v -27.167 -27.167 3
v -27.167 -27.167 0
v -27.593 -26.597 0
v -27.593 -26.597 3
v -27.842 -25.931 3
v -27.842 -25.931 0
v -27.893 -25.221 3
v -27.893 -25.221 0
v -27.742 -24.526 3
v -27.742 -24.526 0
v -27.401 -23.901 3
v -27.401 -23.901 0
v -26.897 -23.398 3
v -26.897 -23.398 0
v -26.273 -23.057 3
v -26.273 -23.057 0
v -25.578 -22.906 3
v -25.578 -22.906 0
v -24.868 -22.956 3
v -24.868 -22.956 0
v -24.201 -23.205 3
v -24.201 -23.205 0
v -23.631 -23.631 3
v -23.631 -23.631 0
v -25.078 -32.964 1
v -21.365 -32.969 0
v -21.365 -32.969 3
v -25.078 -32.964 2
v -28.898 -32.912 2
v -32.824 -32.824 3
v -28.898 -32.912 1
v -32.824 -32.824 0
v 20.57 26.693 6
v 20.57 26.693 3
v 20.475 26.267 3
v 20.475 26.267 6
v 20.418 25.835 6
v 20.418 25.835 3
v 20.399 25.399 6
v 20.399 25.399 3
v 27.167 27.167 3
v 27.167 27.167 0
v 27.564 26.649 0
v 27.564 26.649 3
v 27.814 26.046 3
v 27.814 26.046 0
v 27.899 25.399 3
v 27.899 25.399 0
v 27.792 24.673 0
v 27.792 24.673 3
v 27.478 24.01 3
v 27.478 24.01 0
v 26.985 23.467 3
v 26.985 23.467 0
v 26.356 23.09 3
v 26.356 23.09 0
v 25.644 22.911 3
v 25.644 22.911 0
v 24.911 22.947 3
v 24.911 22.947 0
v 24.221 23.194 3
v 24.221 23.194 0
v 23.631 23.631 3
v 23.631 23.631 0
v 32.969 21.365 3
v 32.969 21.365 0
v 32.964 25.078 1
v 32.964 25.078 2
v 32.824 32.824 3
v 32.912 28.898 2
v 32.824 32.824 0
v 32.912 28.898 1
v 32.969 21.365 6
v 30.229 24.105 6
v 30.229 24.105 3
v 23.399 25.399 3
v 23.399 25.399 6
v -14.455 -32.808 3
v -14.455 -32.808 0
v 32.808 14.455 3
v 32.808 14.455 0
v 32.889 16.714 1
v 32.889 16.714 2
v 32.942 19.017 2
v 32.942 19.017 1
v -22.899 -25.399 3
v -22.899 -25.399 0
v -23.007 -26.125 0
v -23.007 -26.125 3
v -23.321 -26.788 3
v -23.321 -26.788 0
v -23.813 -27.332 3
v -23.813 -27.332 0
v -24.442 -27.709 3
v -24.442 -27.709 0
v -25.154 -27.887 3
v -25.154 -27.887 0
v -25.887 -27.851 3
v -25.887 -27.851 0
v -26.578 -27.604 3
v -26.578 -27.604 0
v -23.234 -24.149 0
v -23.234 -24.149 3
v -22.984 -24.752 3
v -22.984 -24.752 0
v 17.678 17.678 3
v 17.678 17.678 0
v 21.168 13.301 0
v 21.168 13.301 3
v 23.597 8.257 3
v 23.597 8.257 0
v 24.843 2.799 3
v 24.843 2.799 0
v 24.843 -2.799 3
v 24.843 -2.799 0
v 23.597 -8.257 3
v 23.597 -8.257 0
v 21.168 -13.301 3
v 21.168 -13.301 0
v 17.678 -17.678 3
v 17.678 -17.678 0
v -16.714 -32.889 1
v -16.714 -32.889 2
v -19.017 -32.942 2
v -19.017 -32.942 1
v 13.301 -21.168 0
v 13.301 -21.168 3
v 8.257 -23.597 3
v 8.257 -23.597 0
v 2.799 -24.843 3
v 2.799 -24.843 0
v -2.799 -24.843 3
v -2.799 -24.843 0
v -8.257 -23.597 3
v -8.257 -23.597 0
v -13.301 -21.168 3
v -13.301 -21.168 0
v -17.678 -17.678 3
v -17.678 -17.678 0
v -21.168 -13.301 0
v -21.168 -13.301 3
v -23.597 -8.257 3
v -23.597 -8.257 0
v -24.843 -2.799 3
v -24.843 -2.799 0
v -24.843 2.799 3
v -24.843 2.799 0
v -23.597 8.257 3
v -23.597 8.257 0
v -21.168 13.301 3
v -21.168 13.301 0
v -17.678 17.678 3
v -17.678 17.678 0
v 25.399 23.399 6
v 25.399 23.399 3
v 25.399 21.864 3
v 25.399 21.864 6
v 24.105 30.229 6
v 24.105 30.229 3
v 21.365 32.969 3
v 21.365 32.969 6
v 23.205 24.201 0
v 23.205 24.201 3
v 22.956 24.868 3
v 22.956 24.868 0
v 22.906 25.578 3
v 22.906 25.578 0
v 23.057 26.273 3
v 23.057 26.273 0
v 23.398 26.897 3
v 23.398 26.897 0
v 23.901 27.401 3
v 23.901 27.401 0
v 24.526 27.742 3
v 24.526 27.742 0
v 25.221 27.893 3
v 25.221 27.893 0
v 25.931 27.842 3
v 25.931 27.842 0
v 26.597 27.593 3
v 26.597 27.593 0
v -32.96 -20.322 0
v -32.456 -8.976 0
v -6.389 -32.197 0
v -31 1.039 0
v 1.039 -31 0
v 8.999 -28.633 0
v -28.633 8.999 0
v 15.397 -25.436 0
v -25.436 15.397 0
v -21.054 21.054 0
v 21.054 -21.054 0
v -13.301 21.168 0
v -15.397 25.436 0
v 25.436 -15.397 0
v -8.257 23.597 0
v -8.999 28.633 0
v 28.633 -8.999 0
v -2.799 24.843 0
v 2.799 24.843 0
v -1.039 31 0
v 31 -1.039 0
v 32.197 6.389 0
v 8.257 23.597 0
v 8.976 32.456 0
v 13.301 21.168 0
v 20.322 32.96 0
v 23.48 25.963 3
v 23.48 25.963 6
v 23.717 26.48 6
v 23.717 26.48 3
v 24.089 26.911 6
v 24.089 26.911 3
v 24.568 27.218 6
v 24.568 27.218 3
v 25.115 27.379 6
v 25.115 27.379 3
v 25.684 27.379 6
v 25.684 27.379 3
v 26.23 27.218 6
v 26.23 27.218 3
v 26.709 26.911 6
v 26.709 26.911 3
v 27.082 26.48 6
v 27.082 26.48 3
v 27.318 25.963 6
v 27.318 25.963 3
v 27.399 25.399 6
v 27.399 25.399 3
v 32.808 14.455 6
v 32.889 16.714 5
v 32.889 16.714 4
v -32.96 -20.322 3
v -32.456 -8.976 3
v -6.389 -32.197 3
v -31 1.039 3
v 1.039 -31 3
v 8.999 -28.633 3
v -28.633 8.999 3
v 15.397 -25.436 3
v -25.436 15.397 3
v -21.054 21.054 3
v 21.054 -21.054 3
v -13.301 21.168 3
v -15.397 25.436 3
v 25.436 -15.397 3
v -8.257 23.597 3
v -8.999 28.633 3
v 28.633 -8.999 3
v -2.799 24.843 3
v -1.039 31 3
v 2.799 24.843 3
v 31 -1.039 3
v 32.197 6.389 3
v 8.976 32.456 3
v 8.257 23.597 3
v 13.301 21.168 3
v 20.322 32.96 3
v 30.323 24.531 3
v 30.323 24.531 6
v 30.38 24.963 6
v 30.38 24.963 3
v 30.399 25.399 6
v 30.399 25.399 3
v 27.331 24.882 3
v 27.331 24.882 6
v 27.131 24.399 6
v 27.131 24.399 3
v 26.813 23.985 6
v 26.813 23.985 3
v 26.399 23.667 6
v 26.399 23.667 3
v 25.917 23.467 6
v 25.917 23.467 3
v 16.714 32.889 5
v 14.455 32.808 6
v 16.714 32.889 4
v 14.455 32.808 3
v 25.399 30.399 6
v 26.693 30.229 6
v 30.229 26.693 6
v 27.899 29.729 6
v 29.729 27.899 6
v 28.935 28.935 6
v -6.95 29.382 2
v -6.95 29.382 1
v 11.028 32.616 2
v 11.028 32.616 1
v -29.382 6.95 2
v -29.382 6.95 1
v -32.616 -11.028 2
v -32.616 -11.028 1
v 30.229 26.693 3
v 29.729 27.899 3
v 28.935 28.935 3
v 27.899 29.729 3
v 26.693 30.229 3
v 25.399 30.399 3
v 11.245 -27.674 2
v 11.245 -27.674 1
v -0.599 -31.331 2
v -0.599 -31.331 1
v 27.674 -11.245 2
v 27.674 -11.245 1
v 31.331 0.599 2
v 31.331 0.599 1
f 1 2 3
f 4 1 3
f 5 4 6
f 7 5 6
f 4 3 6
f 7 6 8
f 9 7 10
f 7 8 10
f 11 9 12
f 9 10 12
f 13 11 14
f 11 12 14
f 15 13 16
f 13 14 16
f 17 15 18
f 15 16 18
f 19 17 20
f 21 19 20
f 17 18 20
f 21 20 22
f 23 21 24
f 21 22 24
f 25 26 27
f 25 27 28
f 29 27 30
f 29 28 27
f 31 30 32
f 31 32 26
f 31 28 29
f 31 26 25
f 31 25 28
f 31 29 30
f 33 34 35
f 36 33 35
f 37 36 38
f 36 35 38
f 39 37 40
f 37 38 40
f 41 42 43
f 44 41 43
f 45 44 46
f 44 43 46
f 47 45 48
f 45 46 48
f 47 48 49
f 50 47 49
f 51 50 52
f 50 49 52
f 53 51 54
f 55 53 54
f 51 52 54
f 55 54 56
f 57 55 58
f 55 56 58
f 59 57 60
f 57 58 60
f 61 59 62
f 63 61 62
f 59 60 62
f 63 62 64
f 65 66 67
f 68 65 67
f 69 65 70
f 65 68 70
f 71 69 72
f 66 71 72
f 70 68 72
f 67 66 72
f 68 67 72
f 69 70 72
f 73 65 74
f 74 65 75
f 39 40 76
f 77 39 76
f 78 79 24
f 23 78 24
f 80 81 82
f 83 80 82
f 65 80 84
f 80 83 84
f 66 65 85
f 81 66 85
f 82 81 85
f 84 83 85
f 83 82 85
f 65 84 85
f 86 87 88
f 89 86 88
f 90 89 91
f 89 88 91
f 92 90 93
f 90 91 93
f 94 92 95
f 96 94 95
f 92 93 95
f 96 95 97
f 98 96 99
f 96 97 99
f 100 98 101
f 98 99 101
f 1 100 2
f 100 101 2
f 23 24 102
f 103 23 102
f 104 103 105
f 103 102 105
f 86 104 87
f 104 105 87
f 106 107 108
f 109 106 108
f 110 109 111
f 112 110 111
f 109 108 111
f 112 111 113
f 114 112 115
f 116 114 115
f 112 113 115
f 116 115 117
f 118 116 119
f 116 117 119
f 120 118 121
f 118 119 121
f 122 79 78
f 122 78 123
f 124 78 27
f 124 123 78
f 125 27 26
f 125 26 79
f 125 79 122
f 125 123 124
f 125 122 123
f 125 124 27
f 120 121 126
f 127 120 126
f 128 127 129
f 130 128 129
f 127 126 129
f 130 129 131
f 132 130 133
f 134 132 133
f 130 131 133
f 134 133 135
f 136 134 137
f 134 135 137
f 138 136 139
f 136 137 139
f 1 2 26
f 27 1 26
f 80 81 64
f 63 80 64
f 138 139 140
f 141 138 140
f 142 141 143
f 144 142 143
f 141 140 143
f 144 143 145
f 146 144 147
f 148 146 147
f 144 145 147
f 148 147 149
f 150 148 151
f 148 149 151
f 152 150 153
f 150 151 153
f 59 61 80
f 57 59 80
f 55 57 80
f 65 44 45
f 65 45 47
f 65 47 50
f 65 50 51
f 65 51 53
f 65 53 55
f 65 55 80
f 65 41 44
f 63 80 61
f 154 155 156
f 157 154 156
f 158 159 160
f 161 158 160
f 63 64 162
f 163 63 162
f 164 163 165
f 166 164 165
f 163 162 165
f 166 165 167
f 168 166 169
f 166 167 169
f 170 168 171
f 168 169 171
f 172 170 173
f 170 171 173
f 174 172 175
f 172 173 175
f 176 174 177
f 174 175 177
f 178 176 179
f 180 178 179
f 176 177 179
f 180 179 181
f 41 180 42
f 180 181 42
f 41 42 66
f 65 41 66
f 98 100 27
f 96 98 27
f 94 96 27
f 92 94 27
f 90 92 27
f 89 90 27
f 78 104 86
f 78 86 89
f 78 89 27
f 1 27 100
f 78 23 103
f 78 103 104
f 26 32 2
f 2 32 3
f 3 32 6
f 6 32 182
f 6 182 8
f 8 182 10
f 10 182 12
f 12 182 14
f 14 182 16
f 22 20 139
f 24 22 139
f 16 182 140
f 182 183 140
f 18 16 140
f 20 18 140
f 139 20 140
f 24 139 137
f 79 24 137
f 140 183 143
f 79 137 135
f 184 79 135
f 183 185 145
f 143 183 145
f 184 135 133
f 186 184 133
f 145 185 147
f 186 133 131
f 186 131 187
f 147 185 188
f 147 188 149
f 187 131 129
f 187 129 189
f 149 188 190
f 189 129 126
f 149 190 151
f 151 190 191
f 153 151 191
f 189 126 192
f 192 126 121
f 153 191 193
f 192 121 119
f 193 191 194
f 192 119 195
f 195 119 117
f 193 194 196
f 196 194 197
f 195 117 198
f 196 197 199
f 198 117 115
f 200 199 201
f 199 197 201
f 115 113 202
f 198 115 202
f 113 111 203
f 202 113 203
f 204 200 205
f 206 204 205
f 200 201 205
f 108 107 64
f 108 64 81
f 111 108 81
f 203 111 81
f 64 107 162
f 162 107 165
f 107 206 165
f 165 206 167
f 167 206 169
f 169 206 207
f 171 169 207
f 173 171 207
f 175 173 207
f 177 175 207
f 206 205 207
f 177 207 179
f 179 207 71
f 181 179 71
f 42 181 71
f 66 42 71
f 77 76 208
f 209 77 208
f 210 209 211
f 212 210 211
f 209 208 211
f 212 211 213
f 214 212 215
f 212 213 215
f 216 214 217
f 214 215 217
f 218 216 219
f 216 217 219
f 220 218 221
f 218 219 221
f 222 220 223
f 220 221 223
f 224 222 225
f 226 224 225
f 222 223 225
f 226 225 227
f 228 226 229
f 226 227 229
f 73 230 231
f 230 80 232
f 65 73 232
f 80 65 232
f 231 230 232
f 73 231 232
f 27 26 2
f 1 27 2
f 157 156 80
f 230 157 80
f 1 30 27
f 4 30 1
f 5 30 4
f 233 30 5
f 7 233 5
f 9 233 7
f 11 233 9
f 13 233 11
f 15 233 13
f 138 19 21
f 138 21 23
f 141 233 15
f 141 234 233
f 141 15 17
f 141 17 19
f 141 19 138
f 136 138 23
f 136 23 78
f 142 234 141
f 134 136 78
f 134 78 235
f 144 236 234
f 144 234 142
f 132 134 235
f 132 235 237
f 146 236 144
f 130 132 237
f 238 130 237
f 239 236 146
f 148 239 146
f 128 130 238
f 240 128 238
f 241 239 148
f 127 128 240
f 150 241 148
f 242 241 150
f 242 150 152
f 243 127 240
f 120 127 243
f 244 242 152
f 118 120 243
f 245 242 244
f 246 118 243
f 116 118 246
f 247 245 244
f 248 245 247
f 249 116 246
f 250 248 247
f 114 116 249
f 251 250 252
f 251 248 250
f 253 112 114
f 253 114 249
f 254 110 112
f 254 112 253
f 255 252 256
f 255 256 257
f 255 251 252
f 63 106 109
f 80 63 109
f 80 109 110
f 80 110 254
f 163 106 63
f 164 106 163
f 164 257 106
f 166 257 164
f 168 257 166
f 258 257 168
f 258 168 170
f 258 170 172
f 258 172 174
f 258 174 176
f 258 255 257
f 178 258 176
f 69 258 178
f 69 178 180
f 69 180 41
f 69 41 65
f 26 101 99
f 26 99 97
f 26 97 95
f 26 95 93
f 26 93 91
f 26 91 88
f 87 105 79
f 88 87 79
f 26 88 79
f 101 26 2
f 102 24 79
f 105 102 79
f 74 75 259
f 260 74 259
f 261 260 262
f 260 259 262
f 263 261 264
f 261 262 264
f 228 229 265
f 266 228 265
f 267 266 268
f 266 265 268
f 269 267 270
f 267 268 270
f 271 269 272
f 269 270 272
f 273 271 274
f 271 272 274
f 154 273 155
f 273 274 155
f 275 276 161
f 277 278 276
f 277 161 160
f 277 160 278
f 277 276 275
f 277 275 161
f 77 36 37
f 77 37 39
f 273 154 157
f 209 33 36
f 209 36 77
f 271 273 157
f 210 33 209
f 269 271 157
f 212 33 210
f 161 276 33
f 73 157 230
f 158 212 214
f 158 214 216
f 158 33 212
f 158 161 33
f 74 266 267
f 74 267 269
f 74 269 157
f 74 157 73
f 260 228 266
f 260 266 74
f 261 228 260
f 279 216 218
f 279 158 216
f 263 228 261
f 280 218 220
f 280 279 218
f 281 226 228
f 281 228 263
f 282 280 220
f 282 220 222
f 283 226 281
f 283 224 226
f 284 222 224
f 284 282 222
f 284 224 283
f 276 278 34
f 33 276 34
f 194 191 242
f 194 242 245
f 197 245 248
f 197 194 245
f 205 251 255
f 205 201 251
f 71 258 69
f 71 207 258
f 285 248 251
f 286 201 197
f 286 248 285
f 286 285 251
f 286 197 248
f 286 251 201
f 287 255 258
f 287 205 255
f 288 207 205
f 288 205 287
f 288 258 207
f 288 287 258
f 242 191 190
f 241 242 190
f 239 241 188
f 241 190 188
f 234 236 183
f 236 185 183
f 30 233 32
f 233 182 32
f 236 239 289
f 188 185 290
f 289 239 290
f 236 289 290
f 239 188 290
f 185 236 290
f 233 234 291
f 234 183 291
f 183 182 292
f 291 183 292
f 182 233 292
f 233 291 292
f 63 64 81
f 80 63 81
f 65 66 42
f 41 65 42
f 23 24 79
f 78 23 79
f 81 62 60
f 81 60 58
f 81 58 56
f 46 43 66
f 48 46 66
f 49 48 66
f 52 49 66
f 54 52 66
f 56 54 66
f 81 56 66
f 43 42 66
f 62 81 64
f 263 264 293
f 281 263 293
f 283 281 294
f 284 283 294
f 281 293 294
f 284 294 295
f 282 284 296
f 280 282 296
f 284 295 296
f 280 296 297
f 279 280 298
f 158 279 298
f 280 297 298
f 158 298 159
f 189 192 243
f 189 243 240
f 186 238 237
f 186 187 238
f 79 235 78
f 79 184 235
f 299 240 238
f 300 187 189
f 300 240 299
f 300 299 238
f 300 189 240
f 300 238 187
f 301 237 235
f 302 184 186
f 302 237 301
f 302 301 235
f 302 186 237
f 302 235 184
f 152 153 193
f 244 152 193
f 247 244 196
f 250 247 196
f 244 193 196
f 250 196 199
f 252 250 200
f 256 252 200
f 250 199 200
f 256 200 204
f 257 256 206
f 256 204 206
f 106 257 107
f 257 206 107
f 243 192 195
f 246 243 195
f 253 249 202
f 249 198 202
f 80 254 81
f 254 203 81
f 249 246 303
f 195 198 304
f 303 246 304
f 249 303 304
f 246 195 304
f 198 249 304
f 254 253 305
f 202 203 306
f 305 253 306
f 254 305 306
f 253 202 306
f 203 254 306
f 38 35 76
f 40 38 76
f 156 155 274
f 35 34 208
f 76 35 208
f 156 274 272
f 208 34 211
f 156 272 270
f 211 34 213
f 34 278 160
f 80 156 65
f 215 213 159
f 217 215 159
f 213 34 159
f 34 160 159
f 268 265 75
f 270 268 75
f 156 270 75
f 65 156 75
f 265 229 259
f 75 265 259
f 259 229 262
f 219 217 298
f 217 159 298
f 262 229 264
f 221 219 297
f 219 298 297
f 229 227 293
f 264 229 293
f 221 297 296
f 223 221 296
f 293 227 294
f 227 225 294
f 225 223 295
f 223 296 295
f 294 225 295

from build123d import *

# Parameters (mm, degrees)
F1_DEPTH = 3
F2_DEPTH = 3
F4_DEPTH = 3


with BuildPart() as f1:
    # F0 (on Top) → F1 (new body)
    with BuildSketch(Plane.XY):
        with BuildLine():
            Line((-17.6776695297, 17.6776695297), (-21.0540489196, 21.0540489196))
            add(Edge.make_bspline(
                [(-21.0540489196, 21.0540489196), (-32.6172978292, 8.9064244237), (-33.4403195997, -9.1381745127), (-32.823822752, -32.823822752)],
                knots=[5.6905599108, 5.6905599108, 5.6905599108, 5.6905599108, 59.653525178, 59.653525178, 59.653525178, 59.653525178], degree=3))
            add(Edge.make_bspline(
                [(-21.3653856494, -32.9685513557), (-25.0248508067, -32.9903335411), (-28.8447343113, -32.9273916076), (-32.823822752, -32.823822752)],
                knots=[50.5879758987, 50.5879758987, 50.5879758987, 50.5879758987, 59.653525178, 59.653525178, 59.653525178, 59.653525178], degree=3))
            Line((-21.3653856494, -32.9685513557), (-27.1669685025, -27.1669685025))
            ThreePointArc((-27.1669685025, -27.1669685025), (-27.1669685025, -23.6314345966), (-23.6314345966, -23.6314345966))
            Line((-23.6314345966, -23.6314345966), (-14.4553227676, -32.8075464256))
            add(Edge.make_bspline(
                [(21.0540489196, -21.0540489196), (12.269278567, -29.4162176905), (0.400558033, -32.1615526479), (-14.4553227676, -32.8075464256)],
                knots=[5.6905599108, 5.6905599108, 5.6905599108, 5.6905599108, 44.7148364329, 44.7148364329, 44.7148364329, 44.7148364329], degree=3))
            add(Edge.make_bspline(
                [(21.0540489196, -21.0540489196), (29.4162176905, -12.269278567), (32.1615526479, -0.400558033), (32.8075464256, 14.4553227676)],
                knots=[5.6905599108, 5.6905599108, 5.6905599108, 5.6905599108, 44.7148364329, 44.7148364329, 44.7148364329, 44.7148364329], degree=3))
            Line((32.8075464256, 14.4553227676), (23.6314345966, 23.6314345966))
            Line((23.6314345966, 23.6314345966), (17.6776695297, 17.6776695297))
            ThreePointArc((17.6776695297, 17.6776695297), (25, 0), (17.6776695297, -17.6776695297))
            ThreePointArc((17.6776695297, -17.6776695297), (0, -25), (-17.6776695297, -17.6776695297))
            ThreePointArc((-17.6776695297, -17.6776695297), (-25, 0), (-17.6776695297, 17.6776695297))
        make_face()
        with BuildLine():
            add(Edge.make_bspline(
                [(-21.0540489196, 21.0540489196), (-8.9064244237, 32.6172978292), (9.1381745127, 33.4403195997), (32.823822752, 32.823822752)],
                knots=[5.6905599108, 5.6905599108, 5.6905599108, 5.6905599108, 59.653525178, 59.653525178, 59.653525178, 59.653525178], degree=3))
            Line((-21.0540489196, 21.0540489196), (-17.6776695297, 17.6776695297))
            ThreePointArc((-17.6776695297, 17.6776695297), (0, 25), (17.6776695297, 17.6776695297))
            Line((17.6776695297, 17.6776695297), (23.6314345966, 23.6314345966))
            ThreePointArc((23.6314345966, 23.6314345966), (23.6314345966, 27.1669685025), (27.1669685025, 27.1669685025))
            Line((27.1669685025, 27.1669685025), (32.823822752, 32.823822752))
        make_face()
        with BuildLine():
            add(Edge.make_bspline(
                [(32.9685513557, 21.3653856494), (32.9903335411, 25.0248508067), (32.9273916076, 28.8447343113), (32.823822752, 32.823822752)],
                knots=[50.5879758987, 50.5879758987, 50.5879758987, 50.5879758987, 59.653525178, 59.653525178, 59.653525178, 59.653525178], degree=3))
            Line((32.823822752, 32.823822752), (27.1669685025, 27.1669685025))
            Line((27.1669685025, 27.1669685025), (32.9685513557, 21.3653856494))
        make_face()
    extrude(amount=F1_DEPTH)


with BuildPart() as f2:
    # F0 (on Top) → F2 (new body)
    with BuildSketch(Plane.XY):
        with BuildLine():
            Line((32.9685513557, 21.3653856494), (27.1669685025, 27.1669685025))
            ThreePointArc((27.1669685025, 27.1669685025), (27.7089003809, 26.3559101305), (27.8992015496, 25.3992015496))
            ThreePointArc((27.8992015496, 25.3992015496), (26.3559101305, 23.0895027183), (23.6314345966, 23.6314345966))
            Line((23.6314345966, 23.6314345966), (32.8075464256, 14.4553227676))
            add(Edge.make_bspline(
                [(32.8075464256, 14.4553227676), (32.9047682549, 16.6911274411), (32.9544397107, 18.9945917154), (32.9685513557, 21.3653856494)],
                knots=[44.7148364329, 44.7148364329, 44.7148364329, 44.7148364329, 50.5879758987, 50.5879758987, 50.5879758987, 50.5879758987], degree=3))
        make_face()
    extrude(amount=F2_DEPTH)


with BuildPart() as f2b:
    # F0 (on Top) → F2, piece 2 (new body)
    with BuildSketch(Plane.XY):
        with BuildLine():
            Line((-27.1669685025, -27.1669685025), (-21.3653856494, -32.9685513557))
            add(Edge.make_bspline(
                [(-14.4553227676, -32.8075464256), (-16.6911274411, -32.9047682549), (-18.9945917154, -32.9544397107), (-21.3653856494, -32.9685513557)],
                knots=[44.7148364329, 44.7148364329, 44.7148364329, 44.7148364329, 50.5879758987, 50.5879758987, 50.5879758987, 50.5879758987], degree=3))
            Line((-14.4553227676, -32.8075464256), (-23.6314345966, -23.6314345966))
            ThreePointArc((-23.6314345966, -23.6314345966), (-23.0895027183, -24.4424929687), (-22.8992015496, -25.3992015496))
            ThreePointArc((-22.8992015496, -25.3992015496), (-24.4424929687, -27.7089003809), (-27.1669685025, -27.1669685025))
        make_face()
    extrude(amount=F2_DEPTH)


with BuildPart() as f4:
    # F3 (on face) → F4 (new body)
    with BuildSketch(Plane.XY.offset(3)):
        with BuildLine():
            ThreePointArc((20.5695724181, 26.6932967751), (20.4419772427, 26.0518325107), (20.3992015496, 25.3992015496))
            Line((20.3992015496, 25.3992015496), (21.8636676436, 25.3992015496))
            Line((21.8636676436, 25.3992015496), (20.5695724181, 26.6932967751))
        make_face()
        with BuildLine():
            Line((25.3992015496, 21.8636676436), (26.6932967751, 20.5695724181))
            ThreePointArc((26.6932967751, 20.5695724181), (28.9347354555, 21.8636676436), (30.228830681, 24.1051063241))
            Line((30.228830681, 24.1051063241), (27.1669685025, 27.1669685025))
            ThreePointArc((27.1669685025, 27.1669685025), (24.4424929687, 27.7089003809), (22.8992015496, 25.3992015496))
            Line((22.8992015496, 25.3992015496), (23.3992015496, 25.3992015496))
            ThreePointArc((23.3992015496, 25.3992015496), (25.3992015496, 27.3992015496), (27.3992015496, 25.3992015496))
            ThreePointArc((27.3992015496, 25.3992015496), (26.8134151119, 23.9849879872), (25.3992015496, 23.3992015496))
            Line((25.3992015496, 23.3992015496), (25.3992015496, 21.8636676436))
        make_face()
        with BuildLine():
            ThreePointArc((30.228830681, 24.1051063241), (28.9347354555, 21.8636676436), (26.6932967751, 20.5695724181))
            Line((26.6932967751, 20.5695724181), (32.8075464256, 14.4553227676))
            add(Edge.make_bspline(
                [(32.8075464256, 14.4553227676), (32.9047682549, 16.6911274411), (32.9544397107, 18.9945917154), (32.9685513557, 21.3653856493)],
                knots=[0.7495757593, 0.7495757593, 0.7495757593, 0.7495757593, 0.8480299487, 0.8480299487, 0.8480299487, 0.8480299487], degree=3))
            Line((32.9685513557, 21.3653856494), (30.228830681, 24.1051063241))
        make_face()
        with BuildLine():
            Line((14.4553227676, 32.8075464256), (20.5695724181, 26.6932967751))
            ThreePointArc((20.5695724181, 26.6932967751), (21.8636676436, 28.9347354555), (24.1051063241, 30.228830681))
            Line((24.1051063241, 30.228830681), (21.3653856494, 32.9685513557))
            add(Edge.make_bspline(
                [(14.4553227676, 32.8075464256), (16.6911274411, 32.9047682549), (18.9945917154, 32.9544397107), (21.3653856493, 32.9685513557)],
                knots=[0.7495757593, 0.7495757593, 0.7495757593, 0.7495757593, 0.8480299487, 0.8480299487, 0.8480299487, 0.8480299487], degree=3))
        make_face()
        with BuildLine():
            ThreePointArc((24.1051063241, 30.228830681), (21.8636676436, 28.9347354555), (20.5695724181, 26.6932967751))
            Line((20.5695724181, 26.6932967751), (21.8636676436, 25.3992015496))
            Line((21.8636676436, 25.3992015496), (22.8992015496, 25.3992015496))
            ThreePointArc((22.8992015496, 25.3992015496), (24.4424929687, 27.7089003809), (27.1669685025, 27.1669685025))
            Line((27.1669685025, 27.1669685025), (24.1051063241, 30.228830681))
        make_face()
        with BuildLine():
            ThreePointArc((30.3992015496, 25.3992015496), (28.4430086946, 29.365968251), (24.1051063241, 30.228830681))
            Line((24.1051063241, 30.228830681), (27.1669685025, 27.1669685025))
            Line((27.1669685025, 27.1669685025), (30.228830681, 24.1051063241))
            ThreePointArc((30.228830681, 24.1051063241), (30.3564258564, 24.7465705885), (30.3992015496, 25.3992015496))
        make_face()
    extrude(amount=F4_DEPTH)


solid = Compound([f1.part, f2.part, f2b.part, f4.part])
